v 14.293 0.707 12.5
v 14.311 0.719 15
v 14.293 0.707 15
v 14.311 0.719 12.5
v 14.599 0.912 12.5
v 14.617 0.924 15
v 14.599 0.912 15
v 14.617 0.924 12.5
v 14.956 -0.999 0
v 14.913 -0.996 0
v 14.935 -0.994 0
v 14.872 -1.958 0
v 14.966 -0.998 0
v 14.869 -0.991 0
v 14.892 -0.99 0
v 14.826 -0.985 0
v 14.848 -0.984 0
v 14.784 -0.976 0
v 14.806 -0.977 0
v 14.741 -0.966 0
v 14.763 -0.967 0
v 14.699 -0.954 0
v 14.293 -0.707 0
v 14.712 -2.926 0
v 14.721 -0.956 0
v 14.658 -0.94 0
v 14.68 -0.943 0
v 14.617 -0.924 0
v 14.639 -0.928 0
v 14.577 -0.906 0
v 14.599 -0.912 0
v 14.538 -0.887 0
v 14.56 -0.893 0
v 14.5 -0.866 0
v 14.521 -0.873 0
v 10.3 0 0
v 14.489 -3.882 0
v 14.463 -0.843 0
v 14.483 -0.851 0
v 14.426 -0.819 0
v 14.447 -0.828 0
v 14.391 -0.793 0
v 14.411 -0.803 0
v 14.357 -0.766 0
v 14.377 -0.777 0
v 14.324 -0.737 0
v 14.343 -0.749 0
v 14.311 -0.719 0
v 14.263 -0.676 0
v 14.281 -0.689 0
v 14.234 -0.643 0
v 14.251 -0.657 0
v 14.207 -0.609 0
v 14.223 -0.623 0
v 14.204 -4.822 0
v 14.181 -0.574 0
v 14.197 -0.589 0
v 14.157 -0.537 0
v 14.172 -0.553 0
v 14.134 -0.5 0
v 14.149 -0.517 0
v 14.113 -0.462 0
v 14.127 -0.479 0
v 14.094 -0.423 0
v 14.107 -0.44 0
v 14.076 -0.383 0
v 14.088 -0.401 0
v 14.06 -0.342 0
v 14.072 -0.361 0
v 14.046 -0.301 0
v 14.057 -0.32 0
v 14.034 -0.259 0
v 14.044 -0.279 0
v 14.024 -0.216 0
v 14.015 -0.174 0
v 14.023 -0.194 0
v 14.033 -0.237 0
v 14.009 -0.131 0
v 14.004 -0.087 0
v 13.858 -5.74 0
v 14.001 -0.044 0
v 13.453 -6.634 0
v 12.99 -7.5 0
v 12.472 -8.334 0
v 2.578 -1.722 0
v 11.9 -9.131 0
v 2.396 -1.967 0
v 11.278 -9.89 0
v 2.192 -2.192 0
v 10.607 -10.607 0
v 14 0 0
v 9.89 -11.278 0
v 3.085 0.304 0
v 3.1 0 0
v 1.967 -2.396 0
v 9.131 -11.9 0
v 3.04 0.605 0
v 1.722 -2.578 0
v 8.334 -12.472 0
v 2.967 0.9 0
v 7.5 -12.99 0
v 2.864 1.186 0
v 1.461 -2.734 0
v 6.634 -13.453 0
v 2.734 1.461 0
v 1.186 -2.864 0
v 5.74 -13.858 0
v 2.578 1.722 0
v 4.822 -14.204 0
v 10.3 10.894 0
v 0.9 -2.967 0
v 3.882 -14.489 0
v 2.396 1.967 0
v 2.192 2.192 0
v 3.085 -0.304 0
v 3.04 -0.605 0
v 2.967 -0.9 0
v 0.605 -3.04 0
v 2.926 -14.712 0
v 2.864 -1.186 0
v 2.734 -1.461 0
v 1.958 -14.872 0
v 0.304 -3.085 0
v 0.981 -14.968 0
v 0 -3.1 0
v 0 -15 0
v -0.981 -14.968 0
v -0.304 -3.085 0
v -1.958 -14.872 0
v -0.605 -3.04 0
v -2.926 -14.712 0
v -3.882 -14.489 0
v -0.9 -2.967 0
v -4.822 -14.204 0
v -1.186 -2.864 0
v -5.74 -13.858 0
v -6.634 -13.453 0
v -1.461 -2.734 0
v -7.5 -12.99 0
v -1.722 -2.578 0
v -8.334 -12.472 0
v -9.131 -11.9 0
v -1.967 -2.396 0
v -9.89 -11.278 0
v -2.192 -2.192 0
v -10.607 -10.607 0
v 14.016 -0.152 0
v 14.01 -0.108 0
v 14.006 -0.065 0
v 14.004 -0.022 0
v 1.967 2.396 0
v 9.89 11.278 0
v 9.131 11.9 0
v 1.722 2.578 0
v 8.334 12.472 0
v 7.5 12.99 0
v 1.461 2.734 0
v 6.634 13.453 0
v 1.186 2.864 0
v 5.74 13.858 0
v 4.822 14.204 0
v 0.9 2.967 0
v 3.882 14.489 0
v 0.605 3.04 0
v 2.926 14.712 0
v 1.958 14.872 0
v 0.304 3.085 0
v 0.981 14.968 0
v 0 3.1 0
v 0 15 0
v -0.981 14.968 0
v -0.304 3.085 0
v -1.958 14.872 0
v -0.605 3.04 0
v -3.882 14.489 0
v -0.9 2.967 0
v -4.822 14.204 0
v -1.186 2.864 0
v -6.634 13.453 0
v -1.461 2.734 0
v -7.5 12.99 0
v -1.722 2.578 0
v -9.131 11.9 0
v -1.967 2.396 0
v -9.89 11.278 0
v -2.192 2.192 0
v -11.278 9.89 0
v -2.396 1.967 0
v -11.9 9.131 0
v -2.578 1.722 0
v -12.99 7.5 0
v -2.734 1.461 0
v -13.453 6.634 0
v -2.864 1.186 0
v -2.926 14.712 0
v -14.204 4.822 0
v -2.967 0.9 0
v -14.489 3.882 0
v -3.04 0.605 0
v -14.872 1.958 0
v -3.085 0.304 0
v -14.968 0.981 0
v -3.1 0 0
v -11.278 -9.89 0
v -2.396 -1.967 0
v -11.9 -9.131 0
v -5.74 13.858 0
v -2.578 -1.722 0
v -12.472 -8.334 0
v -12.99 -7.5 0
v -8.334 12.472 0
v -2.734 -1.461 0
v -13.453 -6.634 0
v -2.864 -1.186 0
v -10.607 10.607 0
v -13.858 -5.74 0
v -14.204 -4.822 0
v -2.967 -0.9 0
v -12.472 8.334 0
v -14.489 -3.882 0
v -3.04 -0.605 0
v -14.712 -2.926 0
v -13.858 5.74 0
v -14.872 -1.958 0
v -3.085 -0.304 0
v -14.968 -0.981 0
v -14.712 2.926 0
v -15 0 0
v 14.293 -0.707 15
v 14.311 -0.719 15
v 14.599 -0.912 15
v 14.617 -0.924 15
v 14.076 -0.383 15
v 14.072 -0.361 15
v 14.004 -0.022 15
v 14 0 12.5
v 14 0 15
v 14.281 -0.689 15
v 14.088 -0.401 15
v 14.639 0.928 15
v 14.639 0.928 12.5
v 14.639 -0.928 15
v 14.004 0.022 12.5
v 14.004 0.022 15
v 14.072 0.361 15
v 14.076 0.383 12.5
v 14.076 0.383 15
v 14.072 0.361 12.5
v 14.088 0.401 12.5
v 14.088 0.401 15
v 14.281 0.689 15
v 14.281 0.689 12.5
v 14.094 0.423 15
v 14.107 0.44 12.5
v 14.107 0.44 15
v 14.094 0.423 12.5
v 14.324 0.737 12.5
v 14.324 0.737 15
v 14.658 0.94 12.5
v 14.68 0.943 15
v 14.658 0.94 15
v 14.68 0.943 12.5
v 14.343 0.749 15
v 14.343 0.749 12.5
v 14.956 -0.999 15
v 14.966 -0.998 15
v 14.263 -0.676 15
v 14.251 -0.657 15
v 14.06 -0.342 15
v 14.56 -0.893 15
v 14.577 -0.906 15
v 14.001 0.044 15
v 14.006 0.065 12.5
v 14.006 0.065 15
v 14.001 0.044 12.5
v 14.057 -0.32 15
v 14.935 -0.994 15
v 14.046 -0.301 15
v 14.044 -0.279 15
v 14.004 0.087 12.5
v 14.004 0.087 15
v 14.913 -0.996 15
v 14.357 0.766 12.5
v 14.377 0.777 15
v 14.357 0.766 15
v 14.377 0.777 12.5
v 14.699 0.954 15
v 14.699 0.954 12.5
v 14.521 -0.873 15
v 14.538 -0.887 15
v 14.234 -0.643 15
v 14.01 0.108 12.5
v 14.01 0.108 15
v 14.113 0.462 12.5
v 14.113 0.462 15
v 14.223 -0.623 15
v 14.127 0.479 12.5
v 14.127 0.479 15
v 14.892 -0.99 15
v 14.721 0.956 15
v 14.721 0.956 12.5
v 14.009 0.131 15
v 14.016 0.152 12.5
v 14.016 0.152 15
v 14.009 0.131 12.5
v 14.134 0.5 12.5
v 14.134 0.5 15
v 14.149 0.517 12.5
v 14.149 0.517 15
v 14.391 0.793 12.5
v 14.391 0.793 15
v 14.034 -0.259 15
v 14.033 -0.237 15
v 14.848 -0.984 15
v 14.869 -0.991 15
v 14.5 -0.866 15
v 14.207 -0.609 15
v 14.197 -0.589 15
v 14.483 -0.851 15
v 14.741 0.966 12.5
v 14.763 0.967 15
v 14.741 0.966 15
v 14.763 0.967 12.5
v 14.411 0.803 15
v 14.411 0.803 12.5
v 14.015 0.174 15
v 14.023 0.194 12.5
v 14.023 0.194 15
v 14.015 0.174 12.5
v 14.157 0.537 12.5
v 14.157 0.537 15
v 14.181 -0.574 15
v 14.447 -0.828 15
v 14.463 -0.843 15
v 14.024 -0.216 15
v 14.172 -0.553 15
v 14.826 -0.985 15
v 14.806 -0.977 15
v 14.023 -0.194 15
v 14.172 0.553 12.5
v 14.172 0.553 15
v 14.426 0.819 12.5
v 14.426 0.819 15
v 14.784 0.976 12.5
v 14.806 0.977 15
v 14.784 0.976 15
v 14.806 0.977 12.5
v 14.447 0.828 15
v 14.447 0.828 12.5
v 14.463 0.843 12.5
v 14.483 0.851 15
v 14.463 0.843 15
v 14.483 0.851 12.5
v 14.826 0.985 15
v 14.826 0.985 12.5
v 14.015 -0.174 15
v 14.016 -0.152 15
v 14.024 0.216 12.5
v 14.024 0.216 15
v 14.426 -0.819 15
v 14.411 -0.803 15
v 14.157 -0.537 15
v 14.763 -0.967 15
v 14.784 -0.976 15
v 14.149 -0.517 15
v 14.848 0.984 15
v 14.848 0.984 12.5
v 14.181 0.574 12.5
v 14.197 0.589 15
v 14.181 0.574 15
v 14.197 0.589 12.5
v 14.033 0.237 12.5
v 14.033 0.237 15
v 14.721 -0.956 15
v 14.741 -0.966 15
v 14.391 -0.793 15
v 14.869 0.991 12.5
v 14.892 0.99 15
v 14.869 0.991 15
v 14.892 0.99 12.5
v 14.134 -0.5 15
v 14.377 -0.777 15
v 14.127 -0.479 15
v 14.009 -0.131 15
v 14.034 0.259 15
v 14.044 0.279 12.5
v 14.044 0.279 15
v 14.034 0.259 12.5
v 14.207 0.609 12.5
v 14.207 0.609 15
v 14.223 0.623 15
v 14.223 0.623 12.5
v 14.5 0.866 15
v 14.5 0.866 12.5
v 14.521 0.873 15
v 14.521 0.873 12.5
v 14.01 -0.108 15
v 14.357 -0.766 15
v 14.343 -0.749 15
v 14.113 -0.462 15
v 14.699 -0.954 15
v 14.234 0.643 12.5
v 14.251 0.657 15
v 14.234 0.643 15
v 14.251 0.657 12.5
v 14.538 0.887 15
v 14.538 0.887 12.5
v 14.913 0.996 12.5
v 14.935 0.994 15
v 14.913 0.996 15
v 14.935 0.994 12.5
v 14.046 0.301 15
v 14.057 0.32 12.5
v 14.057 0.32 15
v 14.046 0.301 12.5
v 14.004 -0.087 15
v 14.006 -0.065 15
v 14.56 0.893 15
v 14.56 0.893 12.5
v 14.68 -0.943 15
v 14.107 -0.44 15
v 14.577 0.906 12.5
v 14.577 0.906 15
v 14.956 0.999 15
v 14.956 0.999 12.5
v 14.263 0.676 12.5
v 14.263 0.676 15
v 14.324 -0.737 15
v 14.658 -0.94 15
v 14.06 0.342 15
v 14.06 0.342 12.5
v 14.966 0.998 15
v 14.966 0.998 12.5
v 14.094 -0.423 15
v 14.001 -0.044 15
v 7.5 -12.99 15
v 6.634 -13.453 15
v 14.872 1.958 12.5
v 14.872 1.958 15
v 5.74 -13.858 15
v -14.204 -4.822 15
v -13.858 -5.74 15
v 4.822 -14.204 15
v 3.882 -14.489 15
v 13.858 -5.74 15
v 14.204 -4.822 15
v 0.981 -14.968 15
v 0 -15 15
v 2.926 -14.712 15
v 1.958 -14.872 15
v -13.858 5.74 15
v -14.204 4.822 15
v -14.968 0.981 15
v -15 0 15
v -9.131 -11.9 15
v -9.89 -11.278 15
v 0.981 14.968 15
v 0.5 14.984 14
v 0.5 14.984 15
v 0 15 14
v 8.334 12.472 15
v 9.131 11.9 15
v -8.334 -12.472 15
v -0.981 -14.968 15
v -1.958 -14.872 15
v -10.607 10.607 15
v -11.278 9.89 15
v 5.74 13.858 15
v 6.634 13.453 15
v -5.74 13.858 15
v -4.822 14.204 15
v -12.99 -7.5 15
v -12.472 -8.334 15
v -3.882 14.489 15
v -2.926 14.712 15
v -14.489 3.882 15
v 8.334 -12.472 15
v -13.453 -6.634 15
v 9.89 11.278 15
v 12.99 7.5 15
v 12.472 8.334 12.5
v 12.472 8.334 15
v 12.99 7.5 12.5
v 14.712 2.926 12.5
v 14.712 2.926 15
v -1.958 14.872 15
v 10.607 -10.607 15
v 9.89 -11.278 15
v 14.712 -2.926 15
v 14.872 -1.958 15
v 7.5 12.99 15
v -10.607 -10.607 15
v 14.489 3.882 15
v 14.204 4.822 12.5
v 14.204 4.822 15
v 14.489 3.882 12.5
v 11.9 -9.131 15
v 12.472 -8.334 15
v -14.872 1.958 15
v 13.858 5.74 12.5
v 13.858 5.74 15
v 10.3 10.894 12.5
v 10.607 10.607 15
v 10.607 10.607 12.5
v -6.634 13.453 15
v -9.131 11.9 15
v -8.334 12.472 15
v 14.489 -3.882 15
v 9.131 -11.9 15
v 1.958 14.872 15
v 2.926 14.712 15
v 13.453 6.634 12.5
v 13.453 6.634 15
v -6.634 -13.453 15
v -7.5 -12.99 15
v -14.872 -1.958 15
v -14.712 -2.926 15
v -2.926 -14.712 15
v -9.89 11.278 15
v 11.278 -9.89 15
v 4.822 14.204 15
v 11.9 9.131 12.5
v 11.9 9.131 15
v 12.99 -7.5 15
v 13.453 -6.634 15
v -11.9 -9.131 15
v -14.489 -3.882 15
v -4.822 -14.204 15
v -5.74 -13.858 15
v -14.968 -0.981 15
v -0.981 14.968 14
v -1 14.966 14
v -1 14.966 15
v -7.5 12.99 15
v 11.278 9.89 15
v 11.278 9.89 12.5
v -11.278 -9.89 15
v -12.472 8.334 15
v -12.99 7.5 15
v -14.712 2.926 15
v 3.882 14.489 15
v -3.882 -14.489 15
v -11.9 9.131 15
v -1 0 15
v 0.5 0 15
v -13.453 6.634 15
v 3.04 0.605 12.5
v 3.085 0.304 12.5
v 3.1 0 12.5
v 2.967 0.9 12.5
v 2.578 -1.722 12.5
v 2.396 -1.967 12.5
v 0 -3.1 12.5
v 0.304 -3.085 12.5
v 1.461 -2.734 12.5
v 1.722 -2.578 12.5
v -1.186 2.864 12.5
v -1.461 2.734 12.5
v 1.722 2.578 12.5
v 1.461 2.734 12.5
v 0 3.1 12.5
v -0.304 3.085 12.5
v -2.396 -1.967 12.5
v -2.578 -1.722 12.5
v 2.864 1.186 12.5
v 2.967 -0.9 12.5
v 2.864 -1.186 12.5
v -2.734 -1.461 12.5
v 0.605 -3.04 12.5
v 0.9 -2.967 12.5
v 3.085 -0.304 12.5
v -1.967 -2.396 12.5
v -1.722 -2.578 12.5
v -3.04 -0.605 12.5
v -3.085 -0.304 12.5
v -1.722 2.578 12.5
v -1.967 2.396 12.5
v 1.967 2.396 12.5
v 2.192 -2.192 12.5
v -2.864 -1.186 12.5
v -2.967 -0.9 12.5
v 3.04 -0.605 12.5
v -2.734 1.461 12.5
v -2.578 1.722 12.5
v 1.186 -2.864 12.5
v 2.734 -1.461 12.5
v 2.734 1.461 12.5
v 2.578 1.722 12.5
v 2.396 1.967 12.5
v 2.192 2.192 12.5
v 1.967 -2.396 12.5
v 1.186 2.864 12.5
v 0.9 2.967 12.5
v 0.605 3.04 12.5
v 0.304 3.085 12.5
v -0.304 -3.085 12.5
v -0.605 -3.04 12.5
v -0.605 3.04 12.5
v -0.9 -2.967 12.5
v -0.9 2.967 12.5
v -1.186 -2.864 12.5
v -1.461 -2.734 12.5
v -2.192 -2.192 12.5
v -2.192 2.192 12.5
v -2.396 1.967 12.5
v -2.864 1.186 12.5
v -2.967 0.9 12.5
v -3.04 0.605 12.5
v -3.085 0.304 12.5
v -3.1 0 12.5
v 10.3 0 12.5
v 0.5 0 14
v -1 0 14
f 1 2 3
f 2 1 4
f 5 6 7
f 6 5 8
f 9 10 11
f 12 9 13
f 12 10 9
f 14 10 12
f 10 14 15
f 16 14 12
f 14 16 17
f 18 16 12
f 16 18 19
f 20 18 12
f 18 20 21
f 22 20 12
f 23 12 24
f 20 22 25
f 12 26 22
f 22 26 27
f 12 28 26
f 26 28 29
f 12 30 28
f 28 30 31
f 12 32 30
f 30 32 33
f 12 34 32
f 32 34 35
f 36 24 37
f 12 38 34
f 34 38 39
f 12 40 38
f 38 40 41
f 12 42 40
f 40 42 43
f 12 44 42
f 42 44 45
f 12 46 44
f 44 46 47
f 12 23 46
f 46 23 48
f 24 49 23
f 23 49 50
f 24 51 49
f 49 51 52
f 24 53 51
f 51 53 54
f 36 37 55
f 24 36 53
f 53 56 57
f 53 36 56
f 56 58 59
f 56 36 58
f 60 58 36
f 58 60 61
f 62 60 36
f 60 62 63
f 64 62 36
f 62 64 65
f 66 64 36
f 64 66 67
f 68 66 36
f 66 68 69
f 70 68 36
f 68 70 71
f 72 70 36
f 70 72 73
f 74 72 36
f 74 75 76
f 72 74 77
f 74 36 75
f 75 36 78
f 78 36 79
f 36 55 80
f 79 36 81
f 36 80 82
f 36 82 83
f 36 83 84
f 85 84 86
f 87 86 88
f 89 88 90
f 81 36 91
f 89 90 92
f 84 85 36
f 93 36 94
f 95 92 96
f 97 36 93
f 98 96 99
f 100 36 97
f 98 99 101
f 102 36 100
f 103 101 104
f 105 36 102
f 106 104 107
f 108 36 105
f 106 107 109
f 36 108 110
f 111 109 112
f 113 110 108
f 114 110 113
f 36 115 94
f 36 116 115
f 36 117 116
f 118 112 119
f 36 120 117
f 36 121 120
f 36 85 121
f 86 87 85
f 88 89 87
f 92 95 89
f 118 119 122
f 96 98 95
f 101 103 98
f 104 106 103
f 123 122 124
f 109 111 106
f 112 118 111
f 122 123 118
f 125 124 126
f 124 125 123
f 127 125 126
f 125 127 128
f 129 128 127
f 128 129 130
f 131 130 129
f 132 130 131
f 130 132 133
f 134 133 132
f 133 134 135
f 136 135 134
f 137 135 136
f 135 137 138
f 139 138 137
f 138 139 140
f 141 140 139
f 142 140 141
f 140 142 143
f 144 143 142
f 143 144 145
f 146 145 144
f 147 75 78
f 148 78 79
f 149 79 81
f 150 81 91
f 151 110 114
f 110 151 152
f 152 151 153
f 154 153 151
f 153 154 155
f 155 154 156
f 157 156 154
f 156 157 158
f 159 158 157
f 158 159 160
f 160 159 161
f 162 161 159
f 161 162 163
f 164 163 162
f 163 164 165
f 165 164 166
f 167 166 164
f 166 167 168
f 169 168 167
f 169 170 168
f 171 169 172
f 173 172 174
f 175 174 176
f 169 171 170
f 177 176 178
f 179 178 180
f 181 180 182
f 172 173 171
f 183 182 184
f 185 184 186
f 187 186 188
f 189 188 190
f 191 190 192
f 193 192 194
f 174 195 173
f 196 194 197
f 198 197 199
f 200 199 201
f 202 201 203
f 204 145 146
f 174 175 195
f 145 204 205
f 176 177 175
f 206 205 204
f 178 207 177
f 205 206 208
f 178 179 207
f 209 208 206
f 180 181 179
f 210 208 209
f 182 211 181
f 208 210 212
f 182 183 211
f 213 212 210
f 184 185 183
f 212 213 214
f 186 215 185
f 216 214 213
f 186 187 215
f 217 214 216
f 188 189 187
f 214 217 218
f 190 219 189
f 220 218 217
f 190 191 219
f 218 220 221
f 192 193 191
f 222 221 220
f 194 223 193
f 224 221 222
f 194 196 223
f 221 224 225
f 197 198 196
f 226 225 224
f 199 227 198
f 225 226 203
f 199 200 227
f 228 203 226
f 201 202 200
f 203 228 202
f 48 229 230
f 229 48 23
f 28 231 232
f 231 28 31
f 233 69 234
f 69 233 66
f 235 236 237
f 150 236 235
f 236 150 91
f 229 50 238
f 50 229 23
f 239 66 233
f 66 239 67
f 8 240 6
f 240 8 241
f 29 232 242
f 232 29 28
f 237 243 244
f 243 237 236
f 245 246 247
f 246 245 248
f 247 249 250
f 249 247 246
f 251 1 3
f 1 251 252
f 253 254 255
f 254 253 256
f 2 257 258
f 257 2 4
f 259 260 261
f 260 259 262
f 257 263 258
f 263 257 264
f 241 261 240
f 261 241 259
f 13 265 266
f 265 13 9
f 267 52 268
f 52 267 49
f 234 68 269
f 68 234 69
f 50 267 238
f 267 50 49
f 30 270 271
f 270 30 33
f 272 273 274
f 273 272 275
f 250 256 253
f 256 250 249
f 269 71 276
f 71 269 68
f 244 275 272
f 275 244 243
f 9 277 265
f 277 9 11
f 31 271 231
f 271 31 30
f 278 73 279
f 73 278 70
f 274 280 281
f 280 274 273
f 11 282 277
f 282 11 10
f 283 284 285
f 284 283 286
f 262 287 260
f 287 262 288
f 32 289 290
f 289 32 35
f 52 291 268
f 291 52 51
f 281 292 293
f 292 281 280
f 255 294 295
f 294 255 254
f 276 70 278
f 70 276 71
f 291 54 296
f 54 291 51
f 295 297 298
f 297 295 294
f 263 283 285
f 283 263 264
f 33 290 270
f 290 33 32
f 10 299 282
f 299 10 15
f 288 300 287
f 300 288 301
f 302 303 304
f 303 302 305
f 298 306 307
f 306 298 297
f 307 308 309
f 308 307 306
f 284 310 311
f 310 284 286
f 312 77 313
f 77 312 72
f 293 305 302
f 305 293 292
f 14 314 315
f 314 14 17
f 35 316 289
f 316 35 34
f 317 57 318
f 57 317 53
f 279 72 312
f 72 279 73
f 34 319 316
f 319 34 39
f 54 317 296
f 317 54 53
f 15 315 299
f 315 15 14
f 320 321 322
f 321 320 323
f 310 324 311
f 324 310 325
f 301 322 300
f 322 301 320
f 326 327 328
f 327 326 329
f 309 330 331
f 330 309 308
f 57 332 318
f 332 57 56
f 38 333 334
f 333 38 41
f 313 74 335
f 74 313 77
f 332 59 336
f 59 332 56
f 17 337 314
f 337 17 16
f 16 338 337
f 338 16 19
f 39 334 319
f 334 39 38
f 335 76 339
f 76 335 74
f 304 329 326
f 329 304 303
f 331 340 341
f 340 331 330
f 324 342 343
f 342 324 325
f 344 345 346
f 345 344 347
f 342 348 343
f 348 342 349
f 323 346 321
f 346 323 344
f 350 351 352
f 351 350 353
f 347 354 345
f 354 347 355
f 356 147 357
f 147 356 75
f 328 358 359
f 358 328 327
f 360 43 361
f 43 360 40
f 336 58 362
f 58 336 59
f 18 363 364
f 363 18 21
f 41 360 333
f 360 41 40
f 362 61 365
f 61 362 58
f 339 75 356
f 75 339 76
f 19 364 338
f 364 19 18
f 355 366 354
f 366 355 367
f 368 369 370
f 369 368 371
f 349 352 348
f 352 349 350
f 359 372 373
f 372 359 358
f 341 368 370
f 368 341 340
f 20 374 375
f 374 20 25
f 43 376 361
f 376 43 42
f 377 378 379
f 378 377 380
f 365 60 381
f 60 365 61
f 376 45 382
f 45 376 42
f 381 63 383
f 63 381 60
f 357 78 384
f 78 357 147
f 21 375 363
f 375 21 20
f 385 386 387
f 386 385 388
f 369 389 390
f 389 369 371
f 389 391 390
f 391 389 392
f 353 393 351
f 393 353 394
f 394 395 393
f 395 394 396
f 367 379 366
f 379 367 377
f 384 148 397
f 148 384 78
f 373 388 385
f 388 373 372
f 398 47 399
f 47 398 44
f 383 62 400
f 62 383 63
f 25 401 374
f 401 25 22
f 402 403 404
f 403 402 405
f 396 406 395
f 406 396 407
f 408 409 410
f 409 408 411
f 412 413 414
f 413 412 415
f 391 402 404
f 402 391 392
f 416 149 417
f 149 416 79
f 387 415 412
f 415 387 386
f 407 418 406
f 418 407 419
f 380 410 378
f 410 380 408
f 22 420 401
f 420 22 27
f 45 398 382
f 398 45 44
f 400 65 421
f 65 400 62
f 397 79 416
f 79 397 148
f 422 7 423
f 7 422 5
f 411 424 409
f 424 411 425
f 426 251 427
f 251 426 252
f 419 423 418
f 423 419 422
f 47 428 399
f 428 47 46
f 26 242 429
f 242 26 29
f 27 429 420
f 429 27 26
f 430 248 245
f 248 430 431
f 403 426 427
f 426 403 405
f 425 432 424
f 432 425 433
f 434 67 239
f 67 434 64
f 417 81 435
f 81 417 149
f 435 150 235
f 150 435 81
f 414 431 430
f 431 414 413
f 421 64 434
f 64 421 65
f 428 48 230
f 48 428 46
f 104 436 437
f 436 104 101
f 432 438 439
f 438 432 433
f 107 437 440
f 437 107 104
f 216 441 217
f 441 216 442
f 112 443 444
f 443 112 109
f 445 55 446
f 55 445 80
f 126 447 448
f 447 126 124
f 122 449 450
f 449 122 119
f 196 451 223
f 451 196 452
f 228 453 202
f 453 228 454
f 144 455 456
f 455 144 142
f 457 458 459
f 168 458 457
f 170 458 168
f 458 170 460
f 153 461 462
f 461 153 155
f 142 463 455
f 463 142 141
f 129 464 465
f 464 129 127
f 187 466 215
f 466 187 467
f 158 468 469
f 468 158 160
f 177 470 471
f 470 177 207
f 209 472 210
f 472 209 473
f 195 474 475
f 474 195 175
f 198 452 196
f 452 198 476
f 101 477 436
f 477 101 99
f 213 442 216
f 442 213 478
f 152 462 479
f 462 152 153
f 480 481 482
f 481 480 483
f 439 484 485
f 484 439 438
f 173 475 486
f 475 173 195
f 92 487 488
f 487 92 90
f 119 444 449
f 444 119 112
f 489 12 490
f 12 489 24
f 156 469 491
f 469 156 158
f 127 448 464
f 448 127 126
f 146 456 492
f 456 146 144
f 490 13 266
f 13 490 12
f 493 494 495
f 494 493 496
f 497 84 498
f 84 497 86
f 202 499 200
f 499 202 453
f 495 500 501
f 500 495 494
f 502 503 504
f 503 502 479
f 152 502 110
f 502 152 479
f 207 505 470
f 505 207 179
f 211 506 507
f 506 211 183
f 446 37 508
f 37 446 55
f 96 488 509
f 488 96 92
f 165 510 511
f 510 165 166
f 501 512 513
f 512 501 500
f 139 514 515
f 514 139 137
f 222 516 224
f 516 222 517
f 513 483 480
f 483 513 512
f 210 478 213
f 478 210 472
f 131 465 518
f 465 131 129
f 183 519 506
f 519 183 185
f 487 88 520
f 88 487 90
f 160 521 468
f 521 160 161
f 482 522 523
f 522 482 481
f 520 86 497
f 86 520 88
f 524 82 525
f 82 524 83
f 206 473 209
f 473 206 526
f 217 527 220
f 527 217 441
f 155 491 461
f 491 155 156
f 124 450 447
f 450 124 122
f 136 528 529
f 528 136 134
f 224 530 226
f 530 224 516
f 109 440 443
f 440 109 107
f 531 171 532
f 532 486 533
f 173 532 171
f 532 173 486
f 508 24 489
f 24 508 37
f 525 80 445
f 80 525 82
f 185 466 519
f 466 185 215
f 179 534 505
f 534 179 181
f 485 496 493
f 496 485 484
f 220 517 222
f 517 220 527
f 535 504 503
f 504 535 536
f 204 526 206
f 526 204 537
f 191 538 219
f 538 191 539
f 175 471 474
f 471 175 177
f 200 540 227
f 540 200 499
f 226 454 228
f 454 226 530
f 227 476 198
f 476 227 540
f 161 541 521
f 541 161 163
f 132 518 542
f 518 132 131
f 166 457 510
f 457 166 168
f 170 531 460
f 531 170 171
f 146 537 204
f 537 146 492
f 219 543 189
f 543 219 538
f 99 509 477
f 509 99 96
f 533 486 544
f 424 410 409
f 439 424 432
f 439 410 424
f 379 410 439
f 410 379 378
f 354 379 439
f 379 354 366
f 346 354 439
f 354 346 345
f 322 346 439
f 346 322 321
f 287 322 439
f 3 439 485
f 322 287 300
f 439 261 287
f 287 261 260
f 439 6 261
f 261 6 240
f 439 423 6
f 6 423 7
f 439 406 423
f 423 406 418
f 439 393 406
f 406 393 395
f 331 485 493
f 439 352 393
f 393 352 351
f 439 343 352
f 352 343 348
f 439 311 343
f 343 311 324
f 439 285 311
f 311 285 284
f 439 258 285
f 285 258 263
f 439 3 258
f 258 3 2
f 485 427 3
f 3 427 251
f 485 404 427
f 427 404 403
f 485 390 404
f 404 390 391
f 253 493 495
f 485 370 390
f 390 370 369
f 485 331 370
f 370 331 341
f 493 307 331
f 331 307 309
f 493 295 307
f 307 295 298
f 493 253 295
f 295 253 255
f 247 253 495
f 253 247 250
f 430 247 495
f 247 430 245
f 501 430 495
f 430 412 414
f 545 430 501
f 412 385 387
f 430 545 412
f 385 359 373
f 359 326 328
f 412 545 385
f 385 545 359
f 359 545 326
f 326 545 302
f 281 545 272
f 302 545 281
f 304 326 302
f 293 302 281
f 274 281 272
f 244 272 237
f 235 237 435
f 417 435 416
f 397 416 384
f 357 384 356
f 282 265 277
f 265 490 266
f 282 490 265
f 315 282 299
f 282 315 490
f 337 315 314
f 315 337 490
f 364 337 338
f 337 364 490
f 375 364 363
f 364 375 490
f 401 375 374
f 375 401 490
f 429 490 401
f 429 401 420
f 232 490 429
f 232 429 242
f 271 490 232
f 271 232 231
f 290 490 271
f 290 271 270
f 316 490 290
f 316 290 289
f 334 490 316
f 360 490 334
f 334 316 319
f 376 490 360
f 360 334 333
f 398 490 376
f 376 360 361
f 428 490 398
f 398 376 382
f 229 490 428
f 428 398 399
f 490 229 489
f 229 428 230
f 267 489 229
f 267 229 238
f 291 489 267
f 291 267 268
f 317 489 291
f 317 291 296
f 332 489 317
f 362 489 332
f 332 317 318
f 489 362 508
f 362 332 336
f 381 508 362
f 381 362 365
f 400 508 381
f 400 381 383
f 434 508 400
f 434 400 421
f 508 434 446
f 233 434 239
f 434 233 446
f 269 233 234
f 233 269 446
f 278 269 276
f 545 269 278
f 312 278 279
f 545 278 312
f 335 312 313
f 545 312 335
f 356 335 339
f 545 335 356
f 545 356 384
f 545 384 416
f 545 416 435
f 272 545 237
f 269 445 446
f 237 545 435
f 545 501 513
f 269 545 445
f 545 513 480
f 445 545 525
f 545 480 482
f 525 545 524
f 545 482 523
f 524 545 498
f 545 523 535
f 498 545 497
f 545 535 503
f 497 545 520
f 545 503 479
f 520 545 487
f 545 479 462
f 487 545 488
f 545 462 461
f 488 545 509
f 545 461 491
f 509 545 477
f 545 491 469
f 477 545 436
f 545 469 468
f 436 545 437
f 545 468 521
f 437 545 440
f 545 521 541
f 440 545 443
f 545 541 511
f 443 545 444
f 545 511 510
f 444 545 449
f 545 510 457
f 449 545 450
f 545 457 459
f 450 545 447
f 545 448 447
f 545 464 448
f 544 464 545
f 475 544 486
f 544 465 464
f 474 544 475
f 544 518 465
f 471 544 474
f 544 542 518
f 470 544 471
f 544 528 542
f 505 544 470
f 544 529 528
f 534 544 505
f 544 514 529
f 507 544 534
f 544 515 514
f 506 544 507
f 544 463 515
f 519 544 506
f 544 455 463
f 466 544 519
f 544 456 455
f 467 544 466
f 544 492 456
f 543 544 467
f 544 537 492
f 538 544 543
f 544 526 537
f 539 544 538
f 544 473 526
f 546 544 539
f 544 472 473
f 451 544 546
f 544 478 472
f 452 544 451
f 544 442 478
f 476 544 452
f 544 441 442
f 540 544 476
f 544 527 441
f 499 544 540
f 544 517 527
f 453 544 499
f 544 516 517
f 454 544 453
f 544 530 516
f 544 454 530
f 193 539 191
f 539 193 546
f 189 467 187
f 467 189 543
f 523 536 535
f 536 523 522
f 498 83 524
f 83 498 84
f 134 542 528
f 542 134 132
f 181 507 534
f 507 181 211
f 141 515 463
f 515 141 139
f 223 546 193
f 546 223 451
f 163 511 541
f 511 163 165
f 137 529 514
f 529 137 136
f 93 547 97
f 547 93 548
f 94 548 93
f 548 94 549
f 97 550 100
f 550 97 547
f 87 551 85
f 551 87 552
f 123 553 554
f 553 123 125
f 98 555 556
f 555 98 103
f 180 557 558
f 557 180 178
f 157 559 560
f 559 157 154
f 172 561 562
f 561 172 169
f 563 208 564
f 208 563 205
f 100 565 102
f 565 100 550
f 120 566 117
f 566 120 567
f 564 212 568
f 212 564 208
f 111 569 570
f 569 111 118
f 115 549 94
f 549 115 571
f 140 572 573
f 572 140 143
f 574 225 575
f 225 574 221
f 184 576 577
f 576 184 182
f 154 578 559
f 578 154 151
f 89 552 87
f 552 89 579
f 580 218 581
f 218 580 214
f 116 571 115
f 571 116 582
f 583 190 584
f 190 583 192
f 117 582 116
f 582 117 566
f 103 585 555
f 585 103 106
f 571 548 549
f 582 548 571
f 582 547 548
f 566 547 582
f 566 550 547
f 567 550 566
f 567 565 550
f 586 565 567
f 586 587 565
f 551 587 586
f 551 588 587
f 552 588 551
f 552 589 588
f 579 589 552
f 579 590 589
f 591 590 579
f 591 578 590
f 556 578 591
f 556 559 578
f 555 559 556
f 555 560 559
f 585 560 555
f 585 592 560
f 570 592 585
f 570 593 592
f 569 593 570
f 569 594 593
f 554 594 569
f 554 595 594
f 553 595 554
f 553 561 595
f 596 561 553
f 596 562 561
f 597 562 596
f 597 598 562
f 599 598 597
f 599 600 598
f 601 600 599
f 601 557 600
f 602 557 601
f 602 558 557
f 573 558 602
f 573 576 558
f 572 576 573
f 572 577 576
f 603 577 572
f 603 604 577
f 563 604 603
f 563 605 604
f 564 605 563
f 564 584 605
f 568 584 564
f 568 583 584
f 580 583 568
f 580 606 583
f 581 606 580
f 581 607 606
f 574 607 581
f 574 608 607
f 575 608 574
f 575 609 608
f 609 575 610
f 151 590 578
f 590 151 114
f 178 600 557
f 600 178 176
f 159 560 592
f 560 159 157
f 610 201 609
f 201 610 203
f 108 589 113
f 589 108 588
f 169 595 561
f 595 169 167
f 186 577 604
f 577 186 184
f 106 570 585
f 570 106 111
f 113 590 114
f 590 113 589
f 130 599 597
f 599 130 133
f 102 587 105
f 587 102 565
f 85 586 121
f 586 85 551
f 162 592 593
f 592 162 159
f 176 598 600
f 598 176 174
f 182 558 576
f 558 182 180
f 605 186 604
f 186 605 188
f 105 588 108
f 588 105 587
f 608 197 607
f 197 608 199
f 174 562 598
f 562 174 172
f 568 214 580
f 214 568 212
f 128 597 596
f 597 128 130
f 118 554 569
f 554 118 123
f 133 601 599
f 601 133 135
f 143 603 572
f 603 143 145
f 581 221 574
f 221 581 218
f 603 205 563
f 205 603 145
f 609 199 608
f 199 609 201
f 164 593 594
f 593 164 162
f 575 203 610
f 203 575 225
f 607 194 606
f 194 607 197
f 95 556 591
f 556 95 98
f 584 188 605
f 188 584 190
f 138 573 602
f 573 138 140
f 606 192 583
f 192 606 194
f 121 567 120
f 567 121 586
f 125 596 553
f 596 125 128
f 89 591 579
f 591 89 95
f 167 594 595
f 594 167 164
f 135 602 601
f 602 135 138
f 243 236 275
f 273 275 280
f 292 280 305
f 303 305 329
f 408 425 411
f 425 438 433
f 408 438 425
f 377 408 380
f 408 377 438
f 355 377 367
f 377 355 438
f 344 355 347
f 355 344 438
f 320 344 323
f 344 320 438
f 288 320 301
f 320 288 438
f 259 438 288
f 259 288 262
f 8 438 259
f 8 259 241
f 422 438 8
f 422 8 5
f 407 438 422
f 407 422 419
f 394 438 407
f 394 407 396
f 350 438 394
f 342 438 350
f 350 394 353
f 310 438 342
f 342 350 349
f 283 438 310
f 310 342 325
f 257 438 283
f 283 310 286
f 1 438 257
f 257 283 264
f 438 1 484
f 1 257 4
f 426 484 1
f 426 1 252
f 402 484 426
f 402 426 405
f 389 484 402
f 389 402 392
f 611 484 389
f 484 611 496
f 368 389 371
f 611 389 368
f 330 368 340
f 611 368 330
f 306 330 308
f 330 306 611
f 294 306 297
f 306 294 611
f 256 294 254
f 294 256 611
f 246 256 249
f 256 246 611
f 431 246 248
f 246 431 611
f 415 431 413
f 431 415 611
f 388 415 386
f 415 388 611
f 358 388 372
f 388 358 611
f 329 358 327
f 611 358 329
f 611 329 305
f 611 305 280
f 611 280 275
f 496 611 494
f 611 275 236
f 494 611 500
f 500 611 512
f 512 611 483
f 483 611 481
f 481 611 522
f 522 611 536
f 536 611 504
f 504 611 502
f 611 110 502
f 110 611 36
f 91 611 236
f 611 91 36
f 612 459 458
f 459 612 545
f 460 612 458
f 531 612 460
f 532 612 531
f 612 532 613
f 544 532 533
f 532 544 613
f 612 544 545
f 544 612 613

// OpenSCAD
// Replacement knob for hotplate stirrer (D-shaft 6 mm)
// Print orientation: side facing hotplate down on bed (z = 0)

// ---------------- Parameters ----------------
knob_d        = 30;    // knob outer diameter
knob_h        = 15;    // knob height
bore_depth    = 12;    // D-shaft blind bore depth from bottom face
shaft_d       = 6.2;   // D-shaft diameter (circle diameter)
flat_to_curve = 4.7;   // distance from flat side of D to opposite circle side
groove_count  = 18;    // number of vertical grip grooves
groove_d      = 2;     // groove diameter (half-cylinder)
pointer_w     = 1.5;   // pointer groove width
pointer_d     = 1;     // pointer groove depth
eps           = 0.5;   // cutter overshoot past faces

$fn = 96;

// ---------------- Model ----------------
difference() {
    // Main knob body
    cylinder(d = knob_d, h = knob_h);

    // D-shaped blind bore from bottom face
    translate([0, 0, -eps])
        cylinder(d = shaft_d, h = bore_depth + 2 * eps, $fn = 64);

    // Flat side of D bore (cut into the cylinder along +X)
    translate([knob_d / 2 - flat_to_curve, 0, -eps])
        cube([flat_to_curve, knob_d, bore_depth + 2 * eps]);

    // Vertical grip grooves around full height, centred on outer surface
    for (i = [0 : groove_count - 1]) {
        a = (i - groove_count / 2) * 360 / groove_count;
        translate([knob_d / 2, 0, 0])
            rotate([0, 0, a])
                cylinder(d = groove_d, h = knob_h + 2 * eps, $fn = 16);
    }

    // Pointer groove on top face, same side as D flat (along +X)
    translate([-pointer_d, 0, knob_h - pointer_d])
        cube([pointer_w, knob_d + 2 * pointer_d, pointer_d + eps]);
}
